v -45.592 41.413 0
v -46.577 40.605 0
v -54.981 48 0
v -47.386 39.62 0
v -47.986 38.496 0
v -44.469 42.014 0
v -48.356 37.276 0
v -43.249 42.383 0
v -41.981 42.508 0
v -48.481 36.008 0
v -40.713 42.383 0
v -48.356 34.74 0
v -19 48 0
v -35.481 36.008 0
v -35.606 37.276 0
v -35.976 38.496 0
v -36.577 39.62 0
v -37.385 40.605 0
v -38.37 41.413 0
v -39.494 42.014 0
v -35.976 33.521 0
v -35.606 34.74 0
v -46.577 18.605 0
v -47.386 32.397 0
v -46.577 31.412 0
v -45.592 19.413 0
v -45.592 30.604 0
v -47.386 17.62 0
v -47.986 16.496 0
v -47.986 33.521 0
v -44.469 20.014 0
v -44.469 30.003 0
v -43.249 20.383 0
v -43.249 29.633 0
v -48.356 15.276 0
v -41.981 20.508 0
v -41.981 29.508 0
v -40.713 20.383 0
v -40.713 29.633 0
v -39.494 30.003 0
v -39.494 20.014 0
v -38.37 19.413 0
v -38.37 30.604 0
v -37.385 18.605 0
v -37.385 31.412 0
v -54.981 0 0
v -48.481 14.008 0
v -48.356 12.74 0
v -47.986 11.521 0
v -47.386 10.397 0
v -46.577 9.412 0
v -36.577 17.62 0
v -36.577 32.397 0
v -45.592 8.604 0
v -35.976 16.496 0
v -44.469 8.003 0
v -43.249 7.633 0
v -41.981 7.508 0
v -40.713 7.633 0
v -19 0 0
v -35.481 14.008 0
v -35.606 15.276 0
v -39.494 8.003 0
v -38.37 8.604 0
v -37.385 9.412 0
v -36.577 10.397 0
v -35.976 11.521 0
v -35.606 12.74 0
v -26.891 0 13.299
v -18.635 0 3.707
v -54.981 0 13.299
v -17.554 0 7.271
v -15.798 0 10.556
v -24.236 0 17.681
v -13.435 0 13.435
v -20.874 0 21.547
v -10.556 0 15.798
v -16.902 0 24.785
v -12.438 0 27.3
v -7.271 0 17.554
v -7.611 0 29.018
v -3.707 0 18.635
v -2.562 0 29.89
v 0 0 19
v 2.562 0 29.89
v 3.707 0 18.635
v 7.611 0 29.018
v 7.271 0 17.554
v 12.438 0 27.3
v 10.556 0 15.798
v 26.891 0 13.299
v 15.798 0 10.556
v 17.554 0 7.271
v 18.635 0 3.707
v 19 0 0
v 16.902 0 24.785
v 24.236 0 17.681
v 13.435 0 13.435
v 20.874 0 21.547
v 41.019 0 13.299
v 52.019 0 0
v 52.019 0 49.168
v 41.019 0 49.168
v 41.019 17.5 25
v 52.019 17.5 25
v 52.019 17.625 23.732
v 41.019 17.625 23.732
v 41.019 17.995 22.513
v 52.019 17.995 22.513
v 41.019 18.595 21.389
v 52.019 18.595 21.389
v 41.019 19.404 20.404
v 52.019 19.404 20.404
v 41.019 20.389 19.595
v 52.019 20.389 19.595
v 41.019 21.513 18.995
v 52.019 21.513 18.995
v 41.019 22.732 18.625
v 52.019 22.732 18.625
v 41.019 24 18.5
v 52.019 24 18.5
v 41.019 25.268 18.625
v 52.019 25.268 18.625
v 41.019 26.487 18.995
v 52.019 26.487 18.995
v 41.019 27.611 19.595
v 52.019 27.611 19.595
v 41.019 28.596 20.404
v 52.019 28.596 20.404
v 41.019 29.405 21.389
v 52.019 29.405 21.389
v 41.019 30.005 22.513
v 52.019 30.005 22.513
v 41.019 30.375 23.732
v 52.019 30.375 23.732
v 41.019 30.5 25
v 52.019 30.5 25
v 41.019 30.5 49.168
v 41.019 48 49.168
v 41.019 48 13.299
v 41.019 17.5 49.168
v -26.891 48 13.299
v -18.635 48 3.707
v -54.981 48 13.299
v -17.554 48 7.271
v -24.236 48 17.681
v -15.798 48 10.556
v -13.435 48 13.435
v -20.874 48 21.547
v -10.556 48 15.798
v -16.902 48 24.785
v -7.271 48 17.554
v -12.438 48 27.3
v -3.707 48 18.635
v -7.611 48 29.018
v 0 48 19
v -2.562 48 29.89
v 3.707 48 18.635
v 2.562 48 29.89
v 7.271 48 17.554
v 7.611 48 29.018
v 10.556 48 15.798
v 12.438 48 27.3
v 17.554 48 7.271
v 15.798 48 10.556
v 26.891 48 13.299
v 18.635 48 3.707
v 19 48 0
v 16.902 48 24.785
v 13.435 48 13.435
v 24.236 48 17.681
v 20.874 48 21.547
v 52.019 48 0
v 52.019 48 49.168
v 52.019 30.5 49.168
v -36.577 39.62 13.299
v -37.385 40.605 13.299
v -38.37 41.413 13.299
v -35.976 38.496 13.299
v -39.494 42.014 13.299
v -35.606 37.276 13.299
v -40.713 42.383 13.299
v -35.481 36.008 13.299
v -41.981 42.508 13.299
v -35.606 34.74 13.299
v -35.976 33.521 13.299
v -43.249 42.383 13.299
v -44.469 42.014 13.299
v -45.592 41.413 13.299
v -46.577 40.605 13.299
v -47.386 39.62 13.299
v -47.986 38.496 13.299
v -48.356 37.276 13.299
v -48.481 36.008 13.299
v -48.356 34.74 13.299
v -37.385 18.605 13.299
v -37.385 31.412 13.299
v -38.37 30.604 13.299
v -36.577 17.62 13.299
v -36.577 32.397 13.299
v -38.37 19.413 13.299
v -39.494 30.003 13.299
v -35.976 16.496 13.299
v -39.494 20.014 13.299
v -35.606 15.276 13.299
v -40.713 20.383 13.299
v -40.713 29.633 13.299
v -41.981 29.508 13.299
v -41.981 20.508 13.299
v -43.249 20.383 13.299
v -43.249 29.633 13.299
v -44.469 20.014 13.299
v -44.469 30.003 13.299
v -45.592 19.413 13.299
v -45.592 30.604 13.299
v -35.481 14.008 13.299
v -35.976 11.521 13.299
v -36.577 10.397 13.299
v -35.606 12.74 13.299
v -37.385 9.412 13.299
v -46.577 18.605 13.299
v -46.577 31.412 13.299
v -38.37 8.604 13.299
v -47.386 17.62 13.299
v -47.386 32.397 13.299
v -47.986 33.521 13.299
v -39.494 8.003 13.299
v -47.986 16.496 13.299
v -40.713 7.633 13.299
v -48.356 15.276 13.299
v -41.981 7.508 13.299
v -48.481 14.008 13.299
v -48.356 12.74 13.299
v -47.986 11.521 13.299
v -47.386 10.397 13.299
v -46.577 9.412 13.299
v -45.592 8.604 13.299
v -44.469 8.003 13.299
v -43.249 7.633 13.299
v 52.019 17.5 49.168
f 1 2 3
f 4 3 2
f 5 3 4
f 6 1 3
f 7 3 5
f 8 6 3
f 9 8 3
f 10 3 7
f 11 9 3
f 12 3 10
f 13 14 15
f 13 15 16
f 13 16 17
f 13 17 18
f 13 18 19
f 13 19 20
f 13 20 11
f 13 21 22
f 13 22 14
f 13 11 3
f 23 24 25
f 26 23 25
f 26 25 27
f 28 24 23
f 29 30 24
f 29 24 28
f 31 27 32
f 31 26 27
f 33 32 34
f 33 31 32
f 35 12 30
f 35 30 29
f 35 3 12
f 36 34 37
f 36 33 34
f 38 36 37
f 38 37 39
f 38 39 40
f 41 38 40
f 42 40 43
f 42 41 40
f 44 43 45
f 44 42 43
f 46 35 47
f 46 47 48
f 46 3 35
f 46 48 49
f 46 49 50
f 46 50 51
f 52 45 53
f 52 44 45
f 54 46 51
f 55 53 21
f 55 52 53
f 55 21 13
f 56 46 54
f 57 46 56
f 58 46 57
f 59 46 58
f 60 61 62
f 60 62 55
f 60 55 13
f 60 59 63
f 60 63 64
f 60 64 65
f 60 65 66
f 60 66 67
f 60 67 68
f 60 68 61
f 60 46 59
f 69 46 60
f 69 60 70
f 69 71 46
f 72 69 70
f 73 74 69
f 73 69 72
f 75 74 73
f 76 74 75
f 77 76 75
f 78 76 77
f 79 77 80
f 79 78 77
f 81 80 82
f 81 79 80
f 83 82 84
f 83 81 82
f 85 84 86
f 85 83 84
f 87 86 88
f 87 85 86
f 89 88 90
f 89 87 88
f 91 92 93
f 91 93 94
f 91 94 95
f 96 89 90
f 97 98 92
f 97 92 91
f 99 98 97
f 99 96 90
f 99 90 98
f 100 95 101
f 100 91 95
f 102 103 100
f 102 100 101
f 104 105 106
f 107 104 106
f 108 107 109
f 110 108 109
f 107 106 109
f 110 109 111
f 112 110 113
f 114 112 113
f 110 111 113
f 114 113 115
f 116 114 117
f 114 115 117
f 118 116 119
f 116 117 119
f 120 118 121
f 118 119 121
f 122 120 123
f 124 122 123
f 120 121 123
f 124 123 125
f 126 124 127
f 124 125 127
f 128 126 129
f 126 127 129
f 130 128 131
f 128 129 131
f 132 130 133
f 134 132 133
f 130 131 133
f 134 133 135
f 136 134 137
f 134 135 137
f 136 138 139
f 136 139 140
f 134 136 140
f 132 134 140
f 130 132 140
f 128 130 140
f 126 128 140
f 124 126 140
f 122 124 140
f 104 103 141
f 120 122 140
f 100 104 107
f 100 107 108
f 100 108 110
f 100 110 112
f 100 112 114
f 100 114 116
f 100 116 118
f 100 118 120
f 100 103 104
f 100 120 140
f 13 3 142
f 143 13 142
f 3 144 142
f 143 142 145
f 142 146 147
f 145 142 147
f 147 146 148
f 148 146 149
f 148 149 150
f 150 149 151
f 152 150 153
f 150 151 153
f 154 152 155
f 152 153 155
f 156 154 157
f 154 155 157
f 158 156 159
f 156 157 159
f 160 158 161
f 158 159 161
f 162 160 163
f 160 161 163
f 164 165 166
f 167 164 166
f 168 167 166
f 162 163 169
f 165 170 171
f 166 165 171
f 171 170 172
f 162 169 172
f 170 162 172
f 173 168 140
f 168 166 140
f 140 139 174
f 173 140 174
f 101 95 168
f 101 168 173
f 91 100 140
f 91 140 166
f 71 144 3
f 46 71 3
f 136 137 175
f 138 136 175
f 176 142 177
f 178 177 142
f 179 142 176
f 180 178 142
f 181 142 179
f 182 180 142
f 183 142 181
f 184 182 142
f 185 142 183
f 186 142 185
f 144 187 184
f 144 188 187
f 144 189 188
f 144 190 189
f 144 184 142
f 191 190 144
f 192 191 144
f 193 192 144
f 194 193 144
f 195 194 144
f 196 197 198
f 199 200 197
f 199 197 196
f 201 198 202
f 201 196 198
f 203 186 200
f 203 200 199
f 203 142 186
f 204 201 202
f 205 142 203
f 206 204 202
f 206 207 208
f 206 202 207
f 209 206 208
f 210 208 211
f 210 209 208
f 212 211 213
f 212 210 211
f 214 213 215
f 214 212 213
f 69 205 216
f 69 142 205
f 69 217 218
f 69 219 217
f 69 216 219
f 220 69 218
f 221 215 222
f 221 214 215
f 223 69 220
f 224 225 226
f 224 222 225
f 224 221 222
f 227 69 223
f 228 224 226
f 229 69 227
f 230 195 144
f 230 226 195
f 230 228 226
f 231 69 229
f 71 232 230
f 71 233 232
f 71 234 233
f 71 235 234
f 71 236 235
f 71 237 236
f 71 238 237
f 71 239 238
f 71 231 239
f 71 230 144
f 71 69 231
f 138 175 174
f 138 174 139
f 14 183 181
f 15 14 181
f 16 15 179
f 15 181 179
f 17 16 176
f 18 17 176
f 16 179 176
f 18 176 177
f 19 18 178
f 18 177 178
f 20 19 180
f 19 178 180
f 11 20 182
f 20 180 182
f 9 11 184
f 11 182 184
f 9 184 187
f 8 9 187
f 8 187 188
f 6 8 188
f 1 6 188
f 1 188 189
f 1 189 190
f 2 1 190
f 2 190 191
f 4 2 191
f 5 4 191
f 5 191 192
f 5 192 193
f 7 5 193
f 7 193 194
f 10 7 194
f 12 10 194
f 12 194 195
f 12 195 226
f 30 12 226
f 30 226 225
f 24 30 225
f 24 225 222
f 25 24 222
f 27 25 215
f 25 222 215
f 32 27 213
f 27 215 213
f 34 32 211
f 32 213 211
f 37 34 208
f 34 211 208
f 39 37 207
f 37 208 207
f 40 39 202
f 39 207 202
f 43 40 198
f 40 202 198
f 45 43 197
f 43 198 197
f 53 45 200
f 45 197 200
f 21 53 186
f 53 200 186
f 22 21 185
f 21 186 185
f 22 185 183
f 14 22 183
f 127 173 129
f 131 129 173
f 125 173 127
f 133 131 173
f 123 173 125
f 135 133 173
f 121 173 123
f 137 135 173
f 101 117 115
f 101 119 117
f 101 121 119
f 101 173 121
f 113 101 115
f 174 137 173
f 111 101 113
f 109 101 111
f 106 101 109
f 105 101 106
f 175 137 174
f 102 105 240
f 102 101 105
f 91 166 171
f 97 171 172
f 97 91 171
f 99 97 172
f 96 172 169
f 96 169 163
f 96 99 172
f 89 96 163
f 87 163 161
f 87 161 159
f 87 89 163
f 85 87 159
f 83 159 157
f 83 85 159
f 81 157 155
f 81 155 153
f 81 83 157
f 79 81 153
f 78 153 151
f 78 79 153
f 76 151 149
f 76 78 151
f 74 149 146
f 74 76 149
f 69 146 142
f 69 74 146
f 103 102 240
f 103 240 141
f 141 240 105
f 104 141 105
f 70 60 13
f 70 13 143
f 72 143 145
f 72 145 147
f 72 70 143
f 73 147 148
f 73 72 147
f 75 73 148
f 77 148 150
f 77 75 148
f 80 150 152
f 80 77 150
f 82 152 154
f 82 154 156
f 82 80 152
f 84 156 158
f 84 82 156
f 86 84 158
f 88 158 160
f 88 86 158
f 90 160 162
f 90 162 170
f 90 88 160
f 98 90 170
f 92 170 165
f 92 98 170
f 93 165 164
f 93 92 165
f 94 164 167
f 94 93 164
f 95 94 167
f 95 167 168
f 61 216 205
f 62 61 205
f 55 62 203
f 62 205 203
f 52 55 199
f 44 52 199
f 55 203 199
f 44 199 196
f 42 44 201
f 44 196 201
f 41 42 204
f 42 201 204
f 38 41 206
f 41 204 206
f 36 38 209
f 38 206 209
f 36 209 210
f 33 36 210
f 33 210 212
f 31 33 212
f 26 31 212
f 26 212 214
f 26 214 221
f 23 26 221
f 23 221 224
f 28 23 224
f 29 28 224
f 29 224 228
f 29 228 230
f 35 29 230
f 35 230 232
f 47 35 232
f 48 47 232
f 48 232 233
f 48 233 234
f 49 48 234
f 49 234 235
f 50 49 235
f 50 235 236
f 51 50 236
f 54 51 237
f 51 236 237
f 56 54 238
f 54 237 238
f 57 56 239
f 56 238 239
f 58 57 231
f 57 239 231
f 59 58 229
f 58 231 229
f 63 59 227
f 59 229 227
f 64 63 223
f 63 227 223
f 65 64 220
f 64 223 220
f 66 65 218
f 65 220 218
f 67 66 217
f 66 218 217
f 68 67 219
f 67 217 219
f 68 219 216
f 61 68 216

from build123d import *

# Parameters (mm, degrees)
F1_DEPTH = 48
F3_DEPTH = 11
F4_R     = 6.5
F5_DEPTH = 13.300004


with BuildPart() as f1:
    # F0 (on Front) → F1 (new body)
    with BuildSketch(Plane.XZ):
        with BuildLine():
            Line((-54.981197, 0), (-19, 0))
            ThreePointArc((-19, 0), (0, 19), (19, 0))
            Line((19, 0), (52.018803, 0))
            Line((52.018803, 0), (52.018803, 49.16832))
            Line((52.018803, 49.16832), (41.018803, 49.16832))
            Line((41.018803, 49.16832), (41.018803, 13.299004))
            Line((41.018803, 13.299004), (26.891197, 13.299004))
            ThreePointArc((26.891197, 13.299004), (0, 30), (-26.891197, 13.299004))
            Line((-26.891197, 13.299004), (-54.981197, 13.299004))
            Line((-54.981197, 13.299004), (-54.981197, 0))
        make_face()
    extrude(amount=-F1_DEPTH)

    # F2 (on face) → F3 (cut)
    with BuildSketch(Plane.YZ.offset(52.018803)):
        with BuildLine():
            Line((30.5, 49.16832), (17.5, 49.16832))
            Line((17.5, 49.16832), (17.5, 25))
            ThreePointArc((17.5, 25), (24, 18.5), (30.5, 25))
            Line((30.5, 25), (30.5, 49.16832))
        make_face()
    extrude(amount=-F3_DEPTH, mode=Mode.SUBTRACT)

    # F4 (on face) → F5 (cut, through all)
    with BuildSketch(Plane.XY.offset(13.299004)):
        with Locations((-41.981197, 36.00838)):
            Circle(F4_R)
        with Locations((-41.981197, 14.00838)):
            Circle(F4_R)
    extrude(amount=-F5_DEPTH, mode=Mode.SUBTRACT)


solid = f1.part
